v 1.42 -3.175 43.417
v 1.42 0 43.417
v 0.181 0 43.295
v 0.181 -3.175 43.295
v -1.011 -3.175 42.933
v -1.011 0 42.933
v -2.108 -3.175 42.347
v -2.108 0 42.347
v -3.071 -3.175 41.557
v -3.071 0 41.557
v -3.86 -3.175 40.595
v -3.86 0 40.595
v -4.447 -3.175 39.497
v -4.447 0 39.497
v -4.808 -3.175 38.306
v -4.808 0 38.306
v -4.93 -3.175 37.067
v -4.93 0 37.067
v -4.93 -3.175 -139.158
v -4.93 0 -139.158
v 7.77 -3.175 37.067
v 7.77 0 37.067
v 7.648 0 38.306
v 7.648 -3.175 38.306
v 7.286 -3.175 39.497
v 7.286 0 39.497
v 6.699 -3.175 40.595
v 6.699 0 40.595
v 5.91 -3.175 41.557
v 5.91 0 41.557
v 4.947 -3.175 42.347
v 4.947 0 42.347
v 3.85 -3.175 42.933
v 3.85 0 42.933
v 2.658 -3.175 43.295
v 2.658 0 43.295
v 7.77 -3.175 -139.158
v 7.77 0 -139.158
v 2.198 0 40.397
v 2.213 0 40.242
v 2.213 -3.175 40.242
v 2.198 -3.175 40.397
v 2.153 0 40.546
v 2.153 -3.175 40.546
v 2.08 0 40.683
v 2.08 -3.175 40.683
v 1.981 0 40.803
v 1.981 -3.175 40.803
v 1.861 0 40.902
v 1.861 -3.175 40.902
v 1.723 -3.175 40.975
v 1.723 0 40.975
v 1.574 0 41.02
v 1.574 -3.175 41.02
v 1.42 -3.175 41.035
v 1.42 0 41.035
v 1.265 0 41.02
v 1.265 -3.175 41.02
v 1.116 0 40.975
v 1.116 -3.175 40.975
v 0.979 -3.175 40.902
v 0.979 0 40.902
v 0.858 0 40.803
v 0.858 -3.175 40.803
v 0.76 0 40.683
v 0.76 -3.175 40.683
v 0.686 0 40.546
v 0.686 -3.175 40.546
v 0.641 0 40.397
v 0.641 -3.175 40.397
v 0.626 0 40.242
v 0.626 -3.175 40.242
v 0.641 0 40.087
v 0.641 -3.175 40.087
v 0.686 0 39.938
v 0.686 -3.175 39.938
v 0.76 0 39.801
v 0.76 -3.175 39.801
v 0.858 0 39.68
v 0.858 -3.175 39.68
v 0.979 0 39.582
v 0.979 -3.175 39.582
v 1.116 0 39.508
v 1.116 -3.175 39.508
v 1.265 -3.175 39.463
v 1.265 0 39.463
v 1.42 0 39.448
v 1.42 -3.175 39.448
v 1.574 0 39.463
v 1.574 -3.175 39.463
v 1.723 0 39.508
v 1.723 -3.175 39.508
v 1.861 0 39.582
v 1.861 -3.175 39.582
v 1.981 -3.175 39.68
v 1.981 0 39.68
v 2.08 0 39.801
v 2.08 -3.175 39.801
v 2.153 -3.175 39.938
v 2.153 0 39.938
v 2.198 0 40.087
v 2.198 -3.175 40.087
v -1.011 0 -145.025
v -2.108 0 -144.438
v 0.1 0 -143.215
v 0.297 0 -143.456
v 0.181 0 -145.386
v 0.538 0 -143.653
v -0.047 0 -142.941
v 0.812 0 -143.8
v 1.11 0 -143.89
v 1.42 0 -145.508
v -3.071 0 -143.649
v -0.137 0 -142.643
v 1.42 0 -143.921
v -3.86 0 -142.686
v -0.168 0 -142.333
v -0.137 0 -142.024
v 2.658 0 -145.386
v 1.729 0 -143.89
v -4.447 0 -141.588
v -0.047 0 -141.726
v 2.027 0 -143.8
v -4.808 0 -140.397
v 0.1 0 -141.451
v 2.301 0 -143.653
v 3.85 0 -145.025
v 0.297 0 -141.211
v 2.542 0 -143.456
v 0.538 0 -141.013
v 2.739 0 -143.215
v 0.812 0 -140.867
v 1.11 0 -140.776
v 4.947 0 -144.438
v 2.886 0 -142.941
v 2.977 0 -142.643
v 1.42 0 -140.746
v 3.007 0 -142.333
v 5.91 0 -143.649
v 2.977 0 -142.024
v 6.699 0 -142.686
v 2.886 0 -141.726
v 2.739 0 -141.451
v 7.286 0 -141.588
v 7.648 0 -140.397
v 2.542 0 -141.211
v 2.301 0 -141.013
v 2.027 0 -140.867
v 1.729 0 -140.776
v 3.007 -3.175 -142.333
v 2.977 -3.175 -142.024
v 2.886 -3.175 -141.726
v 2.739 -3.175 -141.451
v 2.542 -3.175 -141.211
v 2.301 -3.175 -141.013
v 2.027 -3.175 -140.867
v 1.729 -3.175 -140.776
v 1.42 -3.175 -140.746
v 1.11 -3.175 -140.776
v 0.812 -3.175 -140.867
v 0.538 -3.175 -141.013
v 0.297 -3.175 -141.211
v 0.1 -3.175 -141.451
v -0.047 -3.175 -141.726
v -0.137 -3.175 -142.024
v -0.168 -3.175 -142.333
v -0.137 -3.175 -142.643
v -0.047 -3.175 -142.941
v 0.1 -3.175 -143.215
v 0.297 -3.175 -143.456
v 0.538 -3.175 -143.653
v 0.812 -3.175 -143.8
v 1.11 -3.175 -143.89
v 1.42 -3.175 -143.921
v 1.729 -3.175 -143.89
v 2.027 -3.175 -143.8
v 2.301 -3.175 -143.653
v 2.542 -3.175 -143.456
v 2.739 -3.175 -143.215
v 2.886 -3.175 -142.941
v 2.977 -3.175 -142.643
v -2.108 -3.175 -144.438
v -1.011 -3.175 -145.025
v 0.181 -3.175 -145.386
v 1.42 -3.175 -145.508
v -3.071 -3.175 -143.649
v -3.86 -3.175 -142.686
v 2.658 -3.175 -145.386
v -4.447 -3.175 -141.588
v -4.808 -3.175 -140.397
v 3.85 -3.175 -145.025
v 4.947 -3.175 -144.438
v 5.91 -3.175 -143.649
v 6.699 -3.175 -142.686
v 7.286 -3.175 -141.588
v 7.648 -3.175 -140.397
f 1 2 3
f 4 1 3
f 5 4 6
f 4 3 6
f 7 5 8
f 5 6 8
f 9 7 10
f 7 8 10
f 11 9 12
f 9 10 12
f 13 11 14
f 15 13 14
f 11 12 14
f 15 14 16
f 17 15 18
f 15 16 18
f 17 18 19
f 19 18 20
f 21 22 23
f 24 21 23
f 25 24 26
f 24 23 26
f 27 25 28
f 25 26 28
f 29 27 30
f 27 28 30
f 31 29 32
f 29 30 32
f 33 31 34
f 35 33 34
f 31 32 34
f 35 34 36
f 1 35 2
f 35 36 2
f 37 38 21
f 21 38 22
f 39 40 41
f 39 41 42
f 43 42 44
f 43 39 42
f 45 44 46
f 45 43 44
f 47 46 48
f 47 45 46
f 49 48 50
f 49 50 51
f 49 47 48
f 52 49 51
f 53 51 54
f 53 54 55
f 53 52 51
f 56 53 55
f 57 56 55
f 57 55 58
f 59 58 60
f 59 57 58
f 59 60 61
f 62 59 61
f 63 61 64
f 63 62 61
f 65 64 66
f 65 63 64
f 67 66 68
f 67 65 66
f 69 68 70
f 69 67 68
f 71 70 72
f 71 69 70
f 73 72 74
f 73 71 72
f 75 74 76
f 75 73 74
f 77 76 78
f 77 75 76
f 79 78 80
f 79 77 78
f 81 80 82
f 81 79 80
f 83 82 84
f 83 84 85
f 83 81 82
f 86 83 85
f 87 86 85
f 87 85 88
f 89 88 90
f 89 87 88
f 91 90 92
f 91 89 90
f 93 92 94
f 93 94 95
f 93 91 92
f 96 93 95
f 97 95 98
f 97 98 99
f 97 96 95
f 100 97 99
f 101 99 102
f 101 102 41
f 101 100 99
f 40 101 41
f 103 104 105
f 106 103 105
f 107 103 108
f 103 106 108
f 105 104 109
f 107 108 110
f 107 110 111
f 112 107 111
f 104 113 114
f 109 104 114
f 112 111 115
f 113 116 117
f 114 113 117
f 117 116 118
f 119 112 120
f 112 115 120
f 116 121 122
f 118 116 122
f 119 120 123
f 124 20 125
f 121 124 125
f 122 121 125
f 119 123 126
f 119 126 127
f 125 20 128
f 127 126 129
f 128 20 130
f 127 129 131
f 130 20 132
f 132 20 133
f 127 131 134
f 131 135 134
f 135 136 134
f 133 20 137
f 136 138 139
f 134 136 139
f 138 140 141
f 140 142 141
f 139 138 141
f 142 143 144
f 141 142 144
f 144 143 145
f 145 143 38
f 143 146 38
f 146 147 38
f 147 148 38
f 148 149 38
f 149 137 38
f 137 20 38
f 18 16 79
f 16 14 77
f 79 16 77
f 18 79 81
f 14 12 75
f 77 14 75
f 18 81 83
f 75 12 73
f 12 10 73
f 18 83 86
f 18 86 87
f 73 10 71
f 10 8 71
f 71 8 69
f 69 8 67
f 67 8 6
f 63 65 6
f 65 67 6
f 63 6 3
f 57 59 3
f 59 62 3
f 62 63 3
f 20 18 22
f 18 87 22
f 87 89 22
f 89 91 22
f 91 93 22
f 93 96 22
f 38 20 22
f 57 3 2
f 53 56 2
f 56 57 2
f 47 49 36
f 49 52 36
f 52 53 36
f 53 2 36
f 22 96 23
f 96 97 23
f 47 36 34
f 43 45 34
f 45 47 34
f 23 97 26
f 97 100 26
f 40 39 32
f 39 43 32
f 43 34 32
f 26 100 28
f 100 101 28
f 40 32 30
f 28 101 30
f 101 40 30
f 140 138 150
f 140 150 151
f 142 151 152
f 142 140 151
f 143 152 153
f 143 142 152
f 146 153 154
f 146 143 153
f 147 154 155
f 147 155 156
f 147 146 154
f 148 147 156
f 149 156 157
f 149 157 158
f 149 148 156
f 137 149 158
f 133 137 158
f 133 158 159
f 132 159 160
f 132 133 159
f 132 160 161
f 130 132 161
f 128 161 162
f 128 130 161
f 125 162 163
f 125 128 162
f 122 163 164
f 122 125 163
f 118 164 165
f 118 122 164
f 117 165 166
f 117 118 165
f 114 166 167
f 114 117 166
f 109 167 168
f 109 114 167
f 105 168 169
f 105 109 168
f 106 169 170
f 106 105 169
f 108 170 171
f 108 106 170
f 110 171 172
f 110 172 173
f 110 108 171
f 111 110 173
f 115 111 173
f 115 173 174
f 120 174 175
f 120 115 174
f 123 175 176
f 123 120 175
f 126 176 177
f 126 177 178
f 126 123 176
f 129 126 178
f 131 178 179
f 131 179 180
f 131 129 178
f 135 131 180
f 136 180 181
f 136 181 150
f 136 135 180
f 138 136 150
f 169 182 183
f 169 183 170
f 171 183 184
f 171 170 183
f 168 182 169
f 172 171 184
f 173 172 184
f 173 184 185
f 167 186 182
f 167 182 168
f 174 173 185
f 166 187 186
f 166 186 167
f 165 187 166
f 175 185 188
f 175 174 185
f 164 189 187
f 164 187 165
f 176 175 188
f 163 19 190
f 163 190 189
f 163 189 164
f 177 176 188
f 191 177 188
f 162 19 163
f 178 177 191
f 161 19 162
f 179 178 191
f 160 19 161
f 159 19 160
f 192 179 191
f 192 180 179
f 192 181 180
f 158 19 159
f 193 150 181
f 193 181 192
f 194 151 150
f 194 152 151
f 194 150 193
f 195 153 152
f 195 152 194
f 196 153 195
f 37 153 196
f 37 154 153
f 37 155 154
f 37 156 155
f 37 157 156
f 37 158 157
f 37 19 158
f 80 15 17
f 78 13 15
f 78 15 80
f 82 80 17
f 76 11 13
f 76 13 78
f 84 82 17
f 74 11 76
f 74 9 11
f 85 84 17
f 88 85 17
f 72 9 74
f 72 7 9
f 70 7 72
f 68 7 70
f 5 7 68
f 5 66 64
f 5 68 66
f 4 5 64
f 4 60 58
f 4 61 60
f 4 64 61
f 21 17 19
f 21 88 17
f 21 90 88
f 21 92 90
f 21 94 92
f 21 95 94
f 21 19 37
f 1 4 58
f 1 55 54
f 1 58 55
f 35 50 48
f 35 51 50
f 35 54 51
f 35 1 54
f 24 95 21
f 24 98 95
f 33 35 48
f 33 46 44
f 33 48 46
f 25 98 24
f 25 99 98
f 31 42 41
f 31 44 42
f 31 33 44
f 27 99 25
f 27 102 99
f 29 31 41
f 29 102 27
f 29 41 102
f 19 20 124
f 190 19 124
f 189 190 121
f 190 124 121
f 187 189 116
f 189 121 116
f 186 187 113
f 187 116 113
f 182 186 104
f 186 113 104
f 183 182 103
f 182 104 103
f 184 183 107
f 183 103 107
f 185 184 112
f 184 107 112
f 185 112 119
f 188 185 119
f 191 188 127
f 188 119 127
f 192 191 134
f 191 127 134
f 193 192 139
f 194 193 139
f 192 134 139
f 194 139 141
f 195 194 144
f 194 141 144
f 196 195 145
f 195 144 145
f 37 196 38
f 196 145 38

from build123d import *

# Parameters (mm, degrees)
F0_R     = 1.5875
F0_R_2   = 0.79375
F1_DEPTH = 3.175


with BuildPart() as f1:
    # F0 (on Front) → F1 (new body)
    with BuildSketch(Plane.XZ):
        with BuildLine():
            ThreePointArc((1.419532, 43.416747), (-3.070596, 41.556875), (-4.930468, 37.066747))
            Line((-4.930468, 37.066747), (-4.930468, -139.158453))
            ThreePointArc((-4.930468, -139.158453), (-3.070596, -143.648581), (1.419532, -145.508453))
            ThreePointArc((1.419532, -145.508453), (5.90966, -143.648581), (7.769532, -139.158453))
            Line((7.769532, -139.158453), (7.769532, 37.066747))
            ThreePointArc((7.769532, 37.066747), (5.90966, 41.556875), (1.419532, 43.416747))
        make_face()
        with Locations((1.419532, -142.333453)):
            Circle(F0_R, mode=Mode.SUBTRACT)
        with Locations((1.419532, 40.241747)):
            Circle(F0_R_2, mode=Mode.SUBTRACT)
    extrude(amount=F1_DEPTH)


solid = f1.part
